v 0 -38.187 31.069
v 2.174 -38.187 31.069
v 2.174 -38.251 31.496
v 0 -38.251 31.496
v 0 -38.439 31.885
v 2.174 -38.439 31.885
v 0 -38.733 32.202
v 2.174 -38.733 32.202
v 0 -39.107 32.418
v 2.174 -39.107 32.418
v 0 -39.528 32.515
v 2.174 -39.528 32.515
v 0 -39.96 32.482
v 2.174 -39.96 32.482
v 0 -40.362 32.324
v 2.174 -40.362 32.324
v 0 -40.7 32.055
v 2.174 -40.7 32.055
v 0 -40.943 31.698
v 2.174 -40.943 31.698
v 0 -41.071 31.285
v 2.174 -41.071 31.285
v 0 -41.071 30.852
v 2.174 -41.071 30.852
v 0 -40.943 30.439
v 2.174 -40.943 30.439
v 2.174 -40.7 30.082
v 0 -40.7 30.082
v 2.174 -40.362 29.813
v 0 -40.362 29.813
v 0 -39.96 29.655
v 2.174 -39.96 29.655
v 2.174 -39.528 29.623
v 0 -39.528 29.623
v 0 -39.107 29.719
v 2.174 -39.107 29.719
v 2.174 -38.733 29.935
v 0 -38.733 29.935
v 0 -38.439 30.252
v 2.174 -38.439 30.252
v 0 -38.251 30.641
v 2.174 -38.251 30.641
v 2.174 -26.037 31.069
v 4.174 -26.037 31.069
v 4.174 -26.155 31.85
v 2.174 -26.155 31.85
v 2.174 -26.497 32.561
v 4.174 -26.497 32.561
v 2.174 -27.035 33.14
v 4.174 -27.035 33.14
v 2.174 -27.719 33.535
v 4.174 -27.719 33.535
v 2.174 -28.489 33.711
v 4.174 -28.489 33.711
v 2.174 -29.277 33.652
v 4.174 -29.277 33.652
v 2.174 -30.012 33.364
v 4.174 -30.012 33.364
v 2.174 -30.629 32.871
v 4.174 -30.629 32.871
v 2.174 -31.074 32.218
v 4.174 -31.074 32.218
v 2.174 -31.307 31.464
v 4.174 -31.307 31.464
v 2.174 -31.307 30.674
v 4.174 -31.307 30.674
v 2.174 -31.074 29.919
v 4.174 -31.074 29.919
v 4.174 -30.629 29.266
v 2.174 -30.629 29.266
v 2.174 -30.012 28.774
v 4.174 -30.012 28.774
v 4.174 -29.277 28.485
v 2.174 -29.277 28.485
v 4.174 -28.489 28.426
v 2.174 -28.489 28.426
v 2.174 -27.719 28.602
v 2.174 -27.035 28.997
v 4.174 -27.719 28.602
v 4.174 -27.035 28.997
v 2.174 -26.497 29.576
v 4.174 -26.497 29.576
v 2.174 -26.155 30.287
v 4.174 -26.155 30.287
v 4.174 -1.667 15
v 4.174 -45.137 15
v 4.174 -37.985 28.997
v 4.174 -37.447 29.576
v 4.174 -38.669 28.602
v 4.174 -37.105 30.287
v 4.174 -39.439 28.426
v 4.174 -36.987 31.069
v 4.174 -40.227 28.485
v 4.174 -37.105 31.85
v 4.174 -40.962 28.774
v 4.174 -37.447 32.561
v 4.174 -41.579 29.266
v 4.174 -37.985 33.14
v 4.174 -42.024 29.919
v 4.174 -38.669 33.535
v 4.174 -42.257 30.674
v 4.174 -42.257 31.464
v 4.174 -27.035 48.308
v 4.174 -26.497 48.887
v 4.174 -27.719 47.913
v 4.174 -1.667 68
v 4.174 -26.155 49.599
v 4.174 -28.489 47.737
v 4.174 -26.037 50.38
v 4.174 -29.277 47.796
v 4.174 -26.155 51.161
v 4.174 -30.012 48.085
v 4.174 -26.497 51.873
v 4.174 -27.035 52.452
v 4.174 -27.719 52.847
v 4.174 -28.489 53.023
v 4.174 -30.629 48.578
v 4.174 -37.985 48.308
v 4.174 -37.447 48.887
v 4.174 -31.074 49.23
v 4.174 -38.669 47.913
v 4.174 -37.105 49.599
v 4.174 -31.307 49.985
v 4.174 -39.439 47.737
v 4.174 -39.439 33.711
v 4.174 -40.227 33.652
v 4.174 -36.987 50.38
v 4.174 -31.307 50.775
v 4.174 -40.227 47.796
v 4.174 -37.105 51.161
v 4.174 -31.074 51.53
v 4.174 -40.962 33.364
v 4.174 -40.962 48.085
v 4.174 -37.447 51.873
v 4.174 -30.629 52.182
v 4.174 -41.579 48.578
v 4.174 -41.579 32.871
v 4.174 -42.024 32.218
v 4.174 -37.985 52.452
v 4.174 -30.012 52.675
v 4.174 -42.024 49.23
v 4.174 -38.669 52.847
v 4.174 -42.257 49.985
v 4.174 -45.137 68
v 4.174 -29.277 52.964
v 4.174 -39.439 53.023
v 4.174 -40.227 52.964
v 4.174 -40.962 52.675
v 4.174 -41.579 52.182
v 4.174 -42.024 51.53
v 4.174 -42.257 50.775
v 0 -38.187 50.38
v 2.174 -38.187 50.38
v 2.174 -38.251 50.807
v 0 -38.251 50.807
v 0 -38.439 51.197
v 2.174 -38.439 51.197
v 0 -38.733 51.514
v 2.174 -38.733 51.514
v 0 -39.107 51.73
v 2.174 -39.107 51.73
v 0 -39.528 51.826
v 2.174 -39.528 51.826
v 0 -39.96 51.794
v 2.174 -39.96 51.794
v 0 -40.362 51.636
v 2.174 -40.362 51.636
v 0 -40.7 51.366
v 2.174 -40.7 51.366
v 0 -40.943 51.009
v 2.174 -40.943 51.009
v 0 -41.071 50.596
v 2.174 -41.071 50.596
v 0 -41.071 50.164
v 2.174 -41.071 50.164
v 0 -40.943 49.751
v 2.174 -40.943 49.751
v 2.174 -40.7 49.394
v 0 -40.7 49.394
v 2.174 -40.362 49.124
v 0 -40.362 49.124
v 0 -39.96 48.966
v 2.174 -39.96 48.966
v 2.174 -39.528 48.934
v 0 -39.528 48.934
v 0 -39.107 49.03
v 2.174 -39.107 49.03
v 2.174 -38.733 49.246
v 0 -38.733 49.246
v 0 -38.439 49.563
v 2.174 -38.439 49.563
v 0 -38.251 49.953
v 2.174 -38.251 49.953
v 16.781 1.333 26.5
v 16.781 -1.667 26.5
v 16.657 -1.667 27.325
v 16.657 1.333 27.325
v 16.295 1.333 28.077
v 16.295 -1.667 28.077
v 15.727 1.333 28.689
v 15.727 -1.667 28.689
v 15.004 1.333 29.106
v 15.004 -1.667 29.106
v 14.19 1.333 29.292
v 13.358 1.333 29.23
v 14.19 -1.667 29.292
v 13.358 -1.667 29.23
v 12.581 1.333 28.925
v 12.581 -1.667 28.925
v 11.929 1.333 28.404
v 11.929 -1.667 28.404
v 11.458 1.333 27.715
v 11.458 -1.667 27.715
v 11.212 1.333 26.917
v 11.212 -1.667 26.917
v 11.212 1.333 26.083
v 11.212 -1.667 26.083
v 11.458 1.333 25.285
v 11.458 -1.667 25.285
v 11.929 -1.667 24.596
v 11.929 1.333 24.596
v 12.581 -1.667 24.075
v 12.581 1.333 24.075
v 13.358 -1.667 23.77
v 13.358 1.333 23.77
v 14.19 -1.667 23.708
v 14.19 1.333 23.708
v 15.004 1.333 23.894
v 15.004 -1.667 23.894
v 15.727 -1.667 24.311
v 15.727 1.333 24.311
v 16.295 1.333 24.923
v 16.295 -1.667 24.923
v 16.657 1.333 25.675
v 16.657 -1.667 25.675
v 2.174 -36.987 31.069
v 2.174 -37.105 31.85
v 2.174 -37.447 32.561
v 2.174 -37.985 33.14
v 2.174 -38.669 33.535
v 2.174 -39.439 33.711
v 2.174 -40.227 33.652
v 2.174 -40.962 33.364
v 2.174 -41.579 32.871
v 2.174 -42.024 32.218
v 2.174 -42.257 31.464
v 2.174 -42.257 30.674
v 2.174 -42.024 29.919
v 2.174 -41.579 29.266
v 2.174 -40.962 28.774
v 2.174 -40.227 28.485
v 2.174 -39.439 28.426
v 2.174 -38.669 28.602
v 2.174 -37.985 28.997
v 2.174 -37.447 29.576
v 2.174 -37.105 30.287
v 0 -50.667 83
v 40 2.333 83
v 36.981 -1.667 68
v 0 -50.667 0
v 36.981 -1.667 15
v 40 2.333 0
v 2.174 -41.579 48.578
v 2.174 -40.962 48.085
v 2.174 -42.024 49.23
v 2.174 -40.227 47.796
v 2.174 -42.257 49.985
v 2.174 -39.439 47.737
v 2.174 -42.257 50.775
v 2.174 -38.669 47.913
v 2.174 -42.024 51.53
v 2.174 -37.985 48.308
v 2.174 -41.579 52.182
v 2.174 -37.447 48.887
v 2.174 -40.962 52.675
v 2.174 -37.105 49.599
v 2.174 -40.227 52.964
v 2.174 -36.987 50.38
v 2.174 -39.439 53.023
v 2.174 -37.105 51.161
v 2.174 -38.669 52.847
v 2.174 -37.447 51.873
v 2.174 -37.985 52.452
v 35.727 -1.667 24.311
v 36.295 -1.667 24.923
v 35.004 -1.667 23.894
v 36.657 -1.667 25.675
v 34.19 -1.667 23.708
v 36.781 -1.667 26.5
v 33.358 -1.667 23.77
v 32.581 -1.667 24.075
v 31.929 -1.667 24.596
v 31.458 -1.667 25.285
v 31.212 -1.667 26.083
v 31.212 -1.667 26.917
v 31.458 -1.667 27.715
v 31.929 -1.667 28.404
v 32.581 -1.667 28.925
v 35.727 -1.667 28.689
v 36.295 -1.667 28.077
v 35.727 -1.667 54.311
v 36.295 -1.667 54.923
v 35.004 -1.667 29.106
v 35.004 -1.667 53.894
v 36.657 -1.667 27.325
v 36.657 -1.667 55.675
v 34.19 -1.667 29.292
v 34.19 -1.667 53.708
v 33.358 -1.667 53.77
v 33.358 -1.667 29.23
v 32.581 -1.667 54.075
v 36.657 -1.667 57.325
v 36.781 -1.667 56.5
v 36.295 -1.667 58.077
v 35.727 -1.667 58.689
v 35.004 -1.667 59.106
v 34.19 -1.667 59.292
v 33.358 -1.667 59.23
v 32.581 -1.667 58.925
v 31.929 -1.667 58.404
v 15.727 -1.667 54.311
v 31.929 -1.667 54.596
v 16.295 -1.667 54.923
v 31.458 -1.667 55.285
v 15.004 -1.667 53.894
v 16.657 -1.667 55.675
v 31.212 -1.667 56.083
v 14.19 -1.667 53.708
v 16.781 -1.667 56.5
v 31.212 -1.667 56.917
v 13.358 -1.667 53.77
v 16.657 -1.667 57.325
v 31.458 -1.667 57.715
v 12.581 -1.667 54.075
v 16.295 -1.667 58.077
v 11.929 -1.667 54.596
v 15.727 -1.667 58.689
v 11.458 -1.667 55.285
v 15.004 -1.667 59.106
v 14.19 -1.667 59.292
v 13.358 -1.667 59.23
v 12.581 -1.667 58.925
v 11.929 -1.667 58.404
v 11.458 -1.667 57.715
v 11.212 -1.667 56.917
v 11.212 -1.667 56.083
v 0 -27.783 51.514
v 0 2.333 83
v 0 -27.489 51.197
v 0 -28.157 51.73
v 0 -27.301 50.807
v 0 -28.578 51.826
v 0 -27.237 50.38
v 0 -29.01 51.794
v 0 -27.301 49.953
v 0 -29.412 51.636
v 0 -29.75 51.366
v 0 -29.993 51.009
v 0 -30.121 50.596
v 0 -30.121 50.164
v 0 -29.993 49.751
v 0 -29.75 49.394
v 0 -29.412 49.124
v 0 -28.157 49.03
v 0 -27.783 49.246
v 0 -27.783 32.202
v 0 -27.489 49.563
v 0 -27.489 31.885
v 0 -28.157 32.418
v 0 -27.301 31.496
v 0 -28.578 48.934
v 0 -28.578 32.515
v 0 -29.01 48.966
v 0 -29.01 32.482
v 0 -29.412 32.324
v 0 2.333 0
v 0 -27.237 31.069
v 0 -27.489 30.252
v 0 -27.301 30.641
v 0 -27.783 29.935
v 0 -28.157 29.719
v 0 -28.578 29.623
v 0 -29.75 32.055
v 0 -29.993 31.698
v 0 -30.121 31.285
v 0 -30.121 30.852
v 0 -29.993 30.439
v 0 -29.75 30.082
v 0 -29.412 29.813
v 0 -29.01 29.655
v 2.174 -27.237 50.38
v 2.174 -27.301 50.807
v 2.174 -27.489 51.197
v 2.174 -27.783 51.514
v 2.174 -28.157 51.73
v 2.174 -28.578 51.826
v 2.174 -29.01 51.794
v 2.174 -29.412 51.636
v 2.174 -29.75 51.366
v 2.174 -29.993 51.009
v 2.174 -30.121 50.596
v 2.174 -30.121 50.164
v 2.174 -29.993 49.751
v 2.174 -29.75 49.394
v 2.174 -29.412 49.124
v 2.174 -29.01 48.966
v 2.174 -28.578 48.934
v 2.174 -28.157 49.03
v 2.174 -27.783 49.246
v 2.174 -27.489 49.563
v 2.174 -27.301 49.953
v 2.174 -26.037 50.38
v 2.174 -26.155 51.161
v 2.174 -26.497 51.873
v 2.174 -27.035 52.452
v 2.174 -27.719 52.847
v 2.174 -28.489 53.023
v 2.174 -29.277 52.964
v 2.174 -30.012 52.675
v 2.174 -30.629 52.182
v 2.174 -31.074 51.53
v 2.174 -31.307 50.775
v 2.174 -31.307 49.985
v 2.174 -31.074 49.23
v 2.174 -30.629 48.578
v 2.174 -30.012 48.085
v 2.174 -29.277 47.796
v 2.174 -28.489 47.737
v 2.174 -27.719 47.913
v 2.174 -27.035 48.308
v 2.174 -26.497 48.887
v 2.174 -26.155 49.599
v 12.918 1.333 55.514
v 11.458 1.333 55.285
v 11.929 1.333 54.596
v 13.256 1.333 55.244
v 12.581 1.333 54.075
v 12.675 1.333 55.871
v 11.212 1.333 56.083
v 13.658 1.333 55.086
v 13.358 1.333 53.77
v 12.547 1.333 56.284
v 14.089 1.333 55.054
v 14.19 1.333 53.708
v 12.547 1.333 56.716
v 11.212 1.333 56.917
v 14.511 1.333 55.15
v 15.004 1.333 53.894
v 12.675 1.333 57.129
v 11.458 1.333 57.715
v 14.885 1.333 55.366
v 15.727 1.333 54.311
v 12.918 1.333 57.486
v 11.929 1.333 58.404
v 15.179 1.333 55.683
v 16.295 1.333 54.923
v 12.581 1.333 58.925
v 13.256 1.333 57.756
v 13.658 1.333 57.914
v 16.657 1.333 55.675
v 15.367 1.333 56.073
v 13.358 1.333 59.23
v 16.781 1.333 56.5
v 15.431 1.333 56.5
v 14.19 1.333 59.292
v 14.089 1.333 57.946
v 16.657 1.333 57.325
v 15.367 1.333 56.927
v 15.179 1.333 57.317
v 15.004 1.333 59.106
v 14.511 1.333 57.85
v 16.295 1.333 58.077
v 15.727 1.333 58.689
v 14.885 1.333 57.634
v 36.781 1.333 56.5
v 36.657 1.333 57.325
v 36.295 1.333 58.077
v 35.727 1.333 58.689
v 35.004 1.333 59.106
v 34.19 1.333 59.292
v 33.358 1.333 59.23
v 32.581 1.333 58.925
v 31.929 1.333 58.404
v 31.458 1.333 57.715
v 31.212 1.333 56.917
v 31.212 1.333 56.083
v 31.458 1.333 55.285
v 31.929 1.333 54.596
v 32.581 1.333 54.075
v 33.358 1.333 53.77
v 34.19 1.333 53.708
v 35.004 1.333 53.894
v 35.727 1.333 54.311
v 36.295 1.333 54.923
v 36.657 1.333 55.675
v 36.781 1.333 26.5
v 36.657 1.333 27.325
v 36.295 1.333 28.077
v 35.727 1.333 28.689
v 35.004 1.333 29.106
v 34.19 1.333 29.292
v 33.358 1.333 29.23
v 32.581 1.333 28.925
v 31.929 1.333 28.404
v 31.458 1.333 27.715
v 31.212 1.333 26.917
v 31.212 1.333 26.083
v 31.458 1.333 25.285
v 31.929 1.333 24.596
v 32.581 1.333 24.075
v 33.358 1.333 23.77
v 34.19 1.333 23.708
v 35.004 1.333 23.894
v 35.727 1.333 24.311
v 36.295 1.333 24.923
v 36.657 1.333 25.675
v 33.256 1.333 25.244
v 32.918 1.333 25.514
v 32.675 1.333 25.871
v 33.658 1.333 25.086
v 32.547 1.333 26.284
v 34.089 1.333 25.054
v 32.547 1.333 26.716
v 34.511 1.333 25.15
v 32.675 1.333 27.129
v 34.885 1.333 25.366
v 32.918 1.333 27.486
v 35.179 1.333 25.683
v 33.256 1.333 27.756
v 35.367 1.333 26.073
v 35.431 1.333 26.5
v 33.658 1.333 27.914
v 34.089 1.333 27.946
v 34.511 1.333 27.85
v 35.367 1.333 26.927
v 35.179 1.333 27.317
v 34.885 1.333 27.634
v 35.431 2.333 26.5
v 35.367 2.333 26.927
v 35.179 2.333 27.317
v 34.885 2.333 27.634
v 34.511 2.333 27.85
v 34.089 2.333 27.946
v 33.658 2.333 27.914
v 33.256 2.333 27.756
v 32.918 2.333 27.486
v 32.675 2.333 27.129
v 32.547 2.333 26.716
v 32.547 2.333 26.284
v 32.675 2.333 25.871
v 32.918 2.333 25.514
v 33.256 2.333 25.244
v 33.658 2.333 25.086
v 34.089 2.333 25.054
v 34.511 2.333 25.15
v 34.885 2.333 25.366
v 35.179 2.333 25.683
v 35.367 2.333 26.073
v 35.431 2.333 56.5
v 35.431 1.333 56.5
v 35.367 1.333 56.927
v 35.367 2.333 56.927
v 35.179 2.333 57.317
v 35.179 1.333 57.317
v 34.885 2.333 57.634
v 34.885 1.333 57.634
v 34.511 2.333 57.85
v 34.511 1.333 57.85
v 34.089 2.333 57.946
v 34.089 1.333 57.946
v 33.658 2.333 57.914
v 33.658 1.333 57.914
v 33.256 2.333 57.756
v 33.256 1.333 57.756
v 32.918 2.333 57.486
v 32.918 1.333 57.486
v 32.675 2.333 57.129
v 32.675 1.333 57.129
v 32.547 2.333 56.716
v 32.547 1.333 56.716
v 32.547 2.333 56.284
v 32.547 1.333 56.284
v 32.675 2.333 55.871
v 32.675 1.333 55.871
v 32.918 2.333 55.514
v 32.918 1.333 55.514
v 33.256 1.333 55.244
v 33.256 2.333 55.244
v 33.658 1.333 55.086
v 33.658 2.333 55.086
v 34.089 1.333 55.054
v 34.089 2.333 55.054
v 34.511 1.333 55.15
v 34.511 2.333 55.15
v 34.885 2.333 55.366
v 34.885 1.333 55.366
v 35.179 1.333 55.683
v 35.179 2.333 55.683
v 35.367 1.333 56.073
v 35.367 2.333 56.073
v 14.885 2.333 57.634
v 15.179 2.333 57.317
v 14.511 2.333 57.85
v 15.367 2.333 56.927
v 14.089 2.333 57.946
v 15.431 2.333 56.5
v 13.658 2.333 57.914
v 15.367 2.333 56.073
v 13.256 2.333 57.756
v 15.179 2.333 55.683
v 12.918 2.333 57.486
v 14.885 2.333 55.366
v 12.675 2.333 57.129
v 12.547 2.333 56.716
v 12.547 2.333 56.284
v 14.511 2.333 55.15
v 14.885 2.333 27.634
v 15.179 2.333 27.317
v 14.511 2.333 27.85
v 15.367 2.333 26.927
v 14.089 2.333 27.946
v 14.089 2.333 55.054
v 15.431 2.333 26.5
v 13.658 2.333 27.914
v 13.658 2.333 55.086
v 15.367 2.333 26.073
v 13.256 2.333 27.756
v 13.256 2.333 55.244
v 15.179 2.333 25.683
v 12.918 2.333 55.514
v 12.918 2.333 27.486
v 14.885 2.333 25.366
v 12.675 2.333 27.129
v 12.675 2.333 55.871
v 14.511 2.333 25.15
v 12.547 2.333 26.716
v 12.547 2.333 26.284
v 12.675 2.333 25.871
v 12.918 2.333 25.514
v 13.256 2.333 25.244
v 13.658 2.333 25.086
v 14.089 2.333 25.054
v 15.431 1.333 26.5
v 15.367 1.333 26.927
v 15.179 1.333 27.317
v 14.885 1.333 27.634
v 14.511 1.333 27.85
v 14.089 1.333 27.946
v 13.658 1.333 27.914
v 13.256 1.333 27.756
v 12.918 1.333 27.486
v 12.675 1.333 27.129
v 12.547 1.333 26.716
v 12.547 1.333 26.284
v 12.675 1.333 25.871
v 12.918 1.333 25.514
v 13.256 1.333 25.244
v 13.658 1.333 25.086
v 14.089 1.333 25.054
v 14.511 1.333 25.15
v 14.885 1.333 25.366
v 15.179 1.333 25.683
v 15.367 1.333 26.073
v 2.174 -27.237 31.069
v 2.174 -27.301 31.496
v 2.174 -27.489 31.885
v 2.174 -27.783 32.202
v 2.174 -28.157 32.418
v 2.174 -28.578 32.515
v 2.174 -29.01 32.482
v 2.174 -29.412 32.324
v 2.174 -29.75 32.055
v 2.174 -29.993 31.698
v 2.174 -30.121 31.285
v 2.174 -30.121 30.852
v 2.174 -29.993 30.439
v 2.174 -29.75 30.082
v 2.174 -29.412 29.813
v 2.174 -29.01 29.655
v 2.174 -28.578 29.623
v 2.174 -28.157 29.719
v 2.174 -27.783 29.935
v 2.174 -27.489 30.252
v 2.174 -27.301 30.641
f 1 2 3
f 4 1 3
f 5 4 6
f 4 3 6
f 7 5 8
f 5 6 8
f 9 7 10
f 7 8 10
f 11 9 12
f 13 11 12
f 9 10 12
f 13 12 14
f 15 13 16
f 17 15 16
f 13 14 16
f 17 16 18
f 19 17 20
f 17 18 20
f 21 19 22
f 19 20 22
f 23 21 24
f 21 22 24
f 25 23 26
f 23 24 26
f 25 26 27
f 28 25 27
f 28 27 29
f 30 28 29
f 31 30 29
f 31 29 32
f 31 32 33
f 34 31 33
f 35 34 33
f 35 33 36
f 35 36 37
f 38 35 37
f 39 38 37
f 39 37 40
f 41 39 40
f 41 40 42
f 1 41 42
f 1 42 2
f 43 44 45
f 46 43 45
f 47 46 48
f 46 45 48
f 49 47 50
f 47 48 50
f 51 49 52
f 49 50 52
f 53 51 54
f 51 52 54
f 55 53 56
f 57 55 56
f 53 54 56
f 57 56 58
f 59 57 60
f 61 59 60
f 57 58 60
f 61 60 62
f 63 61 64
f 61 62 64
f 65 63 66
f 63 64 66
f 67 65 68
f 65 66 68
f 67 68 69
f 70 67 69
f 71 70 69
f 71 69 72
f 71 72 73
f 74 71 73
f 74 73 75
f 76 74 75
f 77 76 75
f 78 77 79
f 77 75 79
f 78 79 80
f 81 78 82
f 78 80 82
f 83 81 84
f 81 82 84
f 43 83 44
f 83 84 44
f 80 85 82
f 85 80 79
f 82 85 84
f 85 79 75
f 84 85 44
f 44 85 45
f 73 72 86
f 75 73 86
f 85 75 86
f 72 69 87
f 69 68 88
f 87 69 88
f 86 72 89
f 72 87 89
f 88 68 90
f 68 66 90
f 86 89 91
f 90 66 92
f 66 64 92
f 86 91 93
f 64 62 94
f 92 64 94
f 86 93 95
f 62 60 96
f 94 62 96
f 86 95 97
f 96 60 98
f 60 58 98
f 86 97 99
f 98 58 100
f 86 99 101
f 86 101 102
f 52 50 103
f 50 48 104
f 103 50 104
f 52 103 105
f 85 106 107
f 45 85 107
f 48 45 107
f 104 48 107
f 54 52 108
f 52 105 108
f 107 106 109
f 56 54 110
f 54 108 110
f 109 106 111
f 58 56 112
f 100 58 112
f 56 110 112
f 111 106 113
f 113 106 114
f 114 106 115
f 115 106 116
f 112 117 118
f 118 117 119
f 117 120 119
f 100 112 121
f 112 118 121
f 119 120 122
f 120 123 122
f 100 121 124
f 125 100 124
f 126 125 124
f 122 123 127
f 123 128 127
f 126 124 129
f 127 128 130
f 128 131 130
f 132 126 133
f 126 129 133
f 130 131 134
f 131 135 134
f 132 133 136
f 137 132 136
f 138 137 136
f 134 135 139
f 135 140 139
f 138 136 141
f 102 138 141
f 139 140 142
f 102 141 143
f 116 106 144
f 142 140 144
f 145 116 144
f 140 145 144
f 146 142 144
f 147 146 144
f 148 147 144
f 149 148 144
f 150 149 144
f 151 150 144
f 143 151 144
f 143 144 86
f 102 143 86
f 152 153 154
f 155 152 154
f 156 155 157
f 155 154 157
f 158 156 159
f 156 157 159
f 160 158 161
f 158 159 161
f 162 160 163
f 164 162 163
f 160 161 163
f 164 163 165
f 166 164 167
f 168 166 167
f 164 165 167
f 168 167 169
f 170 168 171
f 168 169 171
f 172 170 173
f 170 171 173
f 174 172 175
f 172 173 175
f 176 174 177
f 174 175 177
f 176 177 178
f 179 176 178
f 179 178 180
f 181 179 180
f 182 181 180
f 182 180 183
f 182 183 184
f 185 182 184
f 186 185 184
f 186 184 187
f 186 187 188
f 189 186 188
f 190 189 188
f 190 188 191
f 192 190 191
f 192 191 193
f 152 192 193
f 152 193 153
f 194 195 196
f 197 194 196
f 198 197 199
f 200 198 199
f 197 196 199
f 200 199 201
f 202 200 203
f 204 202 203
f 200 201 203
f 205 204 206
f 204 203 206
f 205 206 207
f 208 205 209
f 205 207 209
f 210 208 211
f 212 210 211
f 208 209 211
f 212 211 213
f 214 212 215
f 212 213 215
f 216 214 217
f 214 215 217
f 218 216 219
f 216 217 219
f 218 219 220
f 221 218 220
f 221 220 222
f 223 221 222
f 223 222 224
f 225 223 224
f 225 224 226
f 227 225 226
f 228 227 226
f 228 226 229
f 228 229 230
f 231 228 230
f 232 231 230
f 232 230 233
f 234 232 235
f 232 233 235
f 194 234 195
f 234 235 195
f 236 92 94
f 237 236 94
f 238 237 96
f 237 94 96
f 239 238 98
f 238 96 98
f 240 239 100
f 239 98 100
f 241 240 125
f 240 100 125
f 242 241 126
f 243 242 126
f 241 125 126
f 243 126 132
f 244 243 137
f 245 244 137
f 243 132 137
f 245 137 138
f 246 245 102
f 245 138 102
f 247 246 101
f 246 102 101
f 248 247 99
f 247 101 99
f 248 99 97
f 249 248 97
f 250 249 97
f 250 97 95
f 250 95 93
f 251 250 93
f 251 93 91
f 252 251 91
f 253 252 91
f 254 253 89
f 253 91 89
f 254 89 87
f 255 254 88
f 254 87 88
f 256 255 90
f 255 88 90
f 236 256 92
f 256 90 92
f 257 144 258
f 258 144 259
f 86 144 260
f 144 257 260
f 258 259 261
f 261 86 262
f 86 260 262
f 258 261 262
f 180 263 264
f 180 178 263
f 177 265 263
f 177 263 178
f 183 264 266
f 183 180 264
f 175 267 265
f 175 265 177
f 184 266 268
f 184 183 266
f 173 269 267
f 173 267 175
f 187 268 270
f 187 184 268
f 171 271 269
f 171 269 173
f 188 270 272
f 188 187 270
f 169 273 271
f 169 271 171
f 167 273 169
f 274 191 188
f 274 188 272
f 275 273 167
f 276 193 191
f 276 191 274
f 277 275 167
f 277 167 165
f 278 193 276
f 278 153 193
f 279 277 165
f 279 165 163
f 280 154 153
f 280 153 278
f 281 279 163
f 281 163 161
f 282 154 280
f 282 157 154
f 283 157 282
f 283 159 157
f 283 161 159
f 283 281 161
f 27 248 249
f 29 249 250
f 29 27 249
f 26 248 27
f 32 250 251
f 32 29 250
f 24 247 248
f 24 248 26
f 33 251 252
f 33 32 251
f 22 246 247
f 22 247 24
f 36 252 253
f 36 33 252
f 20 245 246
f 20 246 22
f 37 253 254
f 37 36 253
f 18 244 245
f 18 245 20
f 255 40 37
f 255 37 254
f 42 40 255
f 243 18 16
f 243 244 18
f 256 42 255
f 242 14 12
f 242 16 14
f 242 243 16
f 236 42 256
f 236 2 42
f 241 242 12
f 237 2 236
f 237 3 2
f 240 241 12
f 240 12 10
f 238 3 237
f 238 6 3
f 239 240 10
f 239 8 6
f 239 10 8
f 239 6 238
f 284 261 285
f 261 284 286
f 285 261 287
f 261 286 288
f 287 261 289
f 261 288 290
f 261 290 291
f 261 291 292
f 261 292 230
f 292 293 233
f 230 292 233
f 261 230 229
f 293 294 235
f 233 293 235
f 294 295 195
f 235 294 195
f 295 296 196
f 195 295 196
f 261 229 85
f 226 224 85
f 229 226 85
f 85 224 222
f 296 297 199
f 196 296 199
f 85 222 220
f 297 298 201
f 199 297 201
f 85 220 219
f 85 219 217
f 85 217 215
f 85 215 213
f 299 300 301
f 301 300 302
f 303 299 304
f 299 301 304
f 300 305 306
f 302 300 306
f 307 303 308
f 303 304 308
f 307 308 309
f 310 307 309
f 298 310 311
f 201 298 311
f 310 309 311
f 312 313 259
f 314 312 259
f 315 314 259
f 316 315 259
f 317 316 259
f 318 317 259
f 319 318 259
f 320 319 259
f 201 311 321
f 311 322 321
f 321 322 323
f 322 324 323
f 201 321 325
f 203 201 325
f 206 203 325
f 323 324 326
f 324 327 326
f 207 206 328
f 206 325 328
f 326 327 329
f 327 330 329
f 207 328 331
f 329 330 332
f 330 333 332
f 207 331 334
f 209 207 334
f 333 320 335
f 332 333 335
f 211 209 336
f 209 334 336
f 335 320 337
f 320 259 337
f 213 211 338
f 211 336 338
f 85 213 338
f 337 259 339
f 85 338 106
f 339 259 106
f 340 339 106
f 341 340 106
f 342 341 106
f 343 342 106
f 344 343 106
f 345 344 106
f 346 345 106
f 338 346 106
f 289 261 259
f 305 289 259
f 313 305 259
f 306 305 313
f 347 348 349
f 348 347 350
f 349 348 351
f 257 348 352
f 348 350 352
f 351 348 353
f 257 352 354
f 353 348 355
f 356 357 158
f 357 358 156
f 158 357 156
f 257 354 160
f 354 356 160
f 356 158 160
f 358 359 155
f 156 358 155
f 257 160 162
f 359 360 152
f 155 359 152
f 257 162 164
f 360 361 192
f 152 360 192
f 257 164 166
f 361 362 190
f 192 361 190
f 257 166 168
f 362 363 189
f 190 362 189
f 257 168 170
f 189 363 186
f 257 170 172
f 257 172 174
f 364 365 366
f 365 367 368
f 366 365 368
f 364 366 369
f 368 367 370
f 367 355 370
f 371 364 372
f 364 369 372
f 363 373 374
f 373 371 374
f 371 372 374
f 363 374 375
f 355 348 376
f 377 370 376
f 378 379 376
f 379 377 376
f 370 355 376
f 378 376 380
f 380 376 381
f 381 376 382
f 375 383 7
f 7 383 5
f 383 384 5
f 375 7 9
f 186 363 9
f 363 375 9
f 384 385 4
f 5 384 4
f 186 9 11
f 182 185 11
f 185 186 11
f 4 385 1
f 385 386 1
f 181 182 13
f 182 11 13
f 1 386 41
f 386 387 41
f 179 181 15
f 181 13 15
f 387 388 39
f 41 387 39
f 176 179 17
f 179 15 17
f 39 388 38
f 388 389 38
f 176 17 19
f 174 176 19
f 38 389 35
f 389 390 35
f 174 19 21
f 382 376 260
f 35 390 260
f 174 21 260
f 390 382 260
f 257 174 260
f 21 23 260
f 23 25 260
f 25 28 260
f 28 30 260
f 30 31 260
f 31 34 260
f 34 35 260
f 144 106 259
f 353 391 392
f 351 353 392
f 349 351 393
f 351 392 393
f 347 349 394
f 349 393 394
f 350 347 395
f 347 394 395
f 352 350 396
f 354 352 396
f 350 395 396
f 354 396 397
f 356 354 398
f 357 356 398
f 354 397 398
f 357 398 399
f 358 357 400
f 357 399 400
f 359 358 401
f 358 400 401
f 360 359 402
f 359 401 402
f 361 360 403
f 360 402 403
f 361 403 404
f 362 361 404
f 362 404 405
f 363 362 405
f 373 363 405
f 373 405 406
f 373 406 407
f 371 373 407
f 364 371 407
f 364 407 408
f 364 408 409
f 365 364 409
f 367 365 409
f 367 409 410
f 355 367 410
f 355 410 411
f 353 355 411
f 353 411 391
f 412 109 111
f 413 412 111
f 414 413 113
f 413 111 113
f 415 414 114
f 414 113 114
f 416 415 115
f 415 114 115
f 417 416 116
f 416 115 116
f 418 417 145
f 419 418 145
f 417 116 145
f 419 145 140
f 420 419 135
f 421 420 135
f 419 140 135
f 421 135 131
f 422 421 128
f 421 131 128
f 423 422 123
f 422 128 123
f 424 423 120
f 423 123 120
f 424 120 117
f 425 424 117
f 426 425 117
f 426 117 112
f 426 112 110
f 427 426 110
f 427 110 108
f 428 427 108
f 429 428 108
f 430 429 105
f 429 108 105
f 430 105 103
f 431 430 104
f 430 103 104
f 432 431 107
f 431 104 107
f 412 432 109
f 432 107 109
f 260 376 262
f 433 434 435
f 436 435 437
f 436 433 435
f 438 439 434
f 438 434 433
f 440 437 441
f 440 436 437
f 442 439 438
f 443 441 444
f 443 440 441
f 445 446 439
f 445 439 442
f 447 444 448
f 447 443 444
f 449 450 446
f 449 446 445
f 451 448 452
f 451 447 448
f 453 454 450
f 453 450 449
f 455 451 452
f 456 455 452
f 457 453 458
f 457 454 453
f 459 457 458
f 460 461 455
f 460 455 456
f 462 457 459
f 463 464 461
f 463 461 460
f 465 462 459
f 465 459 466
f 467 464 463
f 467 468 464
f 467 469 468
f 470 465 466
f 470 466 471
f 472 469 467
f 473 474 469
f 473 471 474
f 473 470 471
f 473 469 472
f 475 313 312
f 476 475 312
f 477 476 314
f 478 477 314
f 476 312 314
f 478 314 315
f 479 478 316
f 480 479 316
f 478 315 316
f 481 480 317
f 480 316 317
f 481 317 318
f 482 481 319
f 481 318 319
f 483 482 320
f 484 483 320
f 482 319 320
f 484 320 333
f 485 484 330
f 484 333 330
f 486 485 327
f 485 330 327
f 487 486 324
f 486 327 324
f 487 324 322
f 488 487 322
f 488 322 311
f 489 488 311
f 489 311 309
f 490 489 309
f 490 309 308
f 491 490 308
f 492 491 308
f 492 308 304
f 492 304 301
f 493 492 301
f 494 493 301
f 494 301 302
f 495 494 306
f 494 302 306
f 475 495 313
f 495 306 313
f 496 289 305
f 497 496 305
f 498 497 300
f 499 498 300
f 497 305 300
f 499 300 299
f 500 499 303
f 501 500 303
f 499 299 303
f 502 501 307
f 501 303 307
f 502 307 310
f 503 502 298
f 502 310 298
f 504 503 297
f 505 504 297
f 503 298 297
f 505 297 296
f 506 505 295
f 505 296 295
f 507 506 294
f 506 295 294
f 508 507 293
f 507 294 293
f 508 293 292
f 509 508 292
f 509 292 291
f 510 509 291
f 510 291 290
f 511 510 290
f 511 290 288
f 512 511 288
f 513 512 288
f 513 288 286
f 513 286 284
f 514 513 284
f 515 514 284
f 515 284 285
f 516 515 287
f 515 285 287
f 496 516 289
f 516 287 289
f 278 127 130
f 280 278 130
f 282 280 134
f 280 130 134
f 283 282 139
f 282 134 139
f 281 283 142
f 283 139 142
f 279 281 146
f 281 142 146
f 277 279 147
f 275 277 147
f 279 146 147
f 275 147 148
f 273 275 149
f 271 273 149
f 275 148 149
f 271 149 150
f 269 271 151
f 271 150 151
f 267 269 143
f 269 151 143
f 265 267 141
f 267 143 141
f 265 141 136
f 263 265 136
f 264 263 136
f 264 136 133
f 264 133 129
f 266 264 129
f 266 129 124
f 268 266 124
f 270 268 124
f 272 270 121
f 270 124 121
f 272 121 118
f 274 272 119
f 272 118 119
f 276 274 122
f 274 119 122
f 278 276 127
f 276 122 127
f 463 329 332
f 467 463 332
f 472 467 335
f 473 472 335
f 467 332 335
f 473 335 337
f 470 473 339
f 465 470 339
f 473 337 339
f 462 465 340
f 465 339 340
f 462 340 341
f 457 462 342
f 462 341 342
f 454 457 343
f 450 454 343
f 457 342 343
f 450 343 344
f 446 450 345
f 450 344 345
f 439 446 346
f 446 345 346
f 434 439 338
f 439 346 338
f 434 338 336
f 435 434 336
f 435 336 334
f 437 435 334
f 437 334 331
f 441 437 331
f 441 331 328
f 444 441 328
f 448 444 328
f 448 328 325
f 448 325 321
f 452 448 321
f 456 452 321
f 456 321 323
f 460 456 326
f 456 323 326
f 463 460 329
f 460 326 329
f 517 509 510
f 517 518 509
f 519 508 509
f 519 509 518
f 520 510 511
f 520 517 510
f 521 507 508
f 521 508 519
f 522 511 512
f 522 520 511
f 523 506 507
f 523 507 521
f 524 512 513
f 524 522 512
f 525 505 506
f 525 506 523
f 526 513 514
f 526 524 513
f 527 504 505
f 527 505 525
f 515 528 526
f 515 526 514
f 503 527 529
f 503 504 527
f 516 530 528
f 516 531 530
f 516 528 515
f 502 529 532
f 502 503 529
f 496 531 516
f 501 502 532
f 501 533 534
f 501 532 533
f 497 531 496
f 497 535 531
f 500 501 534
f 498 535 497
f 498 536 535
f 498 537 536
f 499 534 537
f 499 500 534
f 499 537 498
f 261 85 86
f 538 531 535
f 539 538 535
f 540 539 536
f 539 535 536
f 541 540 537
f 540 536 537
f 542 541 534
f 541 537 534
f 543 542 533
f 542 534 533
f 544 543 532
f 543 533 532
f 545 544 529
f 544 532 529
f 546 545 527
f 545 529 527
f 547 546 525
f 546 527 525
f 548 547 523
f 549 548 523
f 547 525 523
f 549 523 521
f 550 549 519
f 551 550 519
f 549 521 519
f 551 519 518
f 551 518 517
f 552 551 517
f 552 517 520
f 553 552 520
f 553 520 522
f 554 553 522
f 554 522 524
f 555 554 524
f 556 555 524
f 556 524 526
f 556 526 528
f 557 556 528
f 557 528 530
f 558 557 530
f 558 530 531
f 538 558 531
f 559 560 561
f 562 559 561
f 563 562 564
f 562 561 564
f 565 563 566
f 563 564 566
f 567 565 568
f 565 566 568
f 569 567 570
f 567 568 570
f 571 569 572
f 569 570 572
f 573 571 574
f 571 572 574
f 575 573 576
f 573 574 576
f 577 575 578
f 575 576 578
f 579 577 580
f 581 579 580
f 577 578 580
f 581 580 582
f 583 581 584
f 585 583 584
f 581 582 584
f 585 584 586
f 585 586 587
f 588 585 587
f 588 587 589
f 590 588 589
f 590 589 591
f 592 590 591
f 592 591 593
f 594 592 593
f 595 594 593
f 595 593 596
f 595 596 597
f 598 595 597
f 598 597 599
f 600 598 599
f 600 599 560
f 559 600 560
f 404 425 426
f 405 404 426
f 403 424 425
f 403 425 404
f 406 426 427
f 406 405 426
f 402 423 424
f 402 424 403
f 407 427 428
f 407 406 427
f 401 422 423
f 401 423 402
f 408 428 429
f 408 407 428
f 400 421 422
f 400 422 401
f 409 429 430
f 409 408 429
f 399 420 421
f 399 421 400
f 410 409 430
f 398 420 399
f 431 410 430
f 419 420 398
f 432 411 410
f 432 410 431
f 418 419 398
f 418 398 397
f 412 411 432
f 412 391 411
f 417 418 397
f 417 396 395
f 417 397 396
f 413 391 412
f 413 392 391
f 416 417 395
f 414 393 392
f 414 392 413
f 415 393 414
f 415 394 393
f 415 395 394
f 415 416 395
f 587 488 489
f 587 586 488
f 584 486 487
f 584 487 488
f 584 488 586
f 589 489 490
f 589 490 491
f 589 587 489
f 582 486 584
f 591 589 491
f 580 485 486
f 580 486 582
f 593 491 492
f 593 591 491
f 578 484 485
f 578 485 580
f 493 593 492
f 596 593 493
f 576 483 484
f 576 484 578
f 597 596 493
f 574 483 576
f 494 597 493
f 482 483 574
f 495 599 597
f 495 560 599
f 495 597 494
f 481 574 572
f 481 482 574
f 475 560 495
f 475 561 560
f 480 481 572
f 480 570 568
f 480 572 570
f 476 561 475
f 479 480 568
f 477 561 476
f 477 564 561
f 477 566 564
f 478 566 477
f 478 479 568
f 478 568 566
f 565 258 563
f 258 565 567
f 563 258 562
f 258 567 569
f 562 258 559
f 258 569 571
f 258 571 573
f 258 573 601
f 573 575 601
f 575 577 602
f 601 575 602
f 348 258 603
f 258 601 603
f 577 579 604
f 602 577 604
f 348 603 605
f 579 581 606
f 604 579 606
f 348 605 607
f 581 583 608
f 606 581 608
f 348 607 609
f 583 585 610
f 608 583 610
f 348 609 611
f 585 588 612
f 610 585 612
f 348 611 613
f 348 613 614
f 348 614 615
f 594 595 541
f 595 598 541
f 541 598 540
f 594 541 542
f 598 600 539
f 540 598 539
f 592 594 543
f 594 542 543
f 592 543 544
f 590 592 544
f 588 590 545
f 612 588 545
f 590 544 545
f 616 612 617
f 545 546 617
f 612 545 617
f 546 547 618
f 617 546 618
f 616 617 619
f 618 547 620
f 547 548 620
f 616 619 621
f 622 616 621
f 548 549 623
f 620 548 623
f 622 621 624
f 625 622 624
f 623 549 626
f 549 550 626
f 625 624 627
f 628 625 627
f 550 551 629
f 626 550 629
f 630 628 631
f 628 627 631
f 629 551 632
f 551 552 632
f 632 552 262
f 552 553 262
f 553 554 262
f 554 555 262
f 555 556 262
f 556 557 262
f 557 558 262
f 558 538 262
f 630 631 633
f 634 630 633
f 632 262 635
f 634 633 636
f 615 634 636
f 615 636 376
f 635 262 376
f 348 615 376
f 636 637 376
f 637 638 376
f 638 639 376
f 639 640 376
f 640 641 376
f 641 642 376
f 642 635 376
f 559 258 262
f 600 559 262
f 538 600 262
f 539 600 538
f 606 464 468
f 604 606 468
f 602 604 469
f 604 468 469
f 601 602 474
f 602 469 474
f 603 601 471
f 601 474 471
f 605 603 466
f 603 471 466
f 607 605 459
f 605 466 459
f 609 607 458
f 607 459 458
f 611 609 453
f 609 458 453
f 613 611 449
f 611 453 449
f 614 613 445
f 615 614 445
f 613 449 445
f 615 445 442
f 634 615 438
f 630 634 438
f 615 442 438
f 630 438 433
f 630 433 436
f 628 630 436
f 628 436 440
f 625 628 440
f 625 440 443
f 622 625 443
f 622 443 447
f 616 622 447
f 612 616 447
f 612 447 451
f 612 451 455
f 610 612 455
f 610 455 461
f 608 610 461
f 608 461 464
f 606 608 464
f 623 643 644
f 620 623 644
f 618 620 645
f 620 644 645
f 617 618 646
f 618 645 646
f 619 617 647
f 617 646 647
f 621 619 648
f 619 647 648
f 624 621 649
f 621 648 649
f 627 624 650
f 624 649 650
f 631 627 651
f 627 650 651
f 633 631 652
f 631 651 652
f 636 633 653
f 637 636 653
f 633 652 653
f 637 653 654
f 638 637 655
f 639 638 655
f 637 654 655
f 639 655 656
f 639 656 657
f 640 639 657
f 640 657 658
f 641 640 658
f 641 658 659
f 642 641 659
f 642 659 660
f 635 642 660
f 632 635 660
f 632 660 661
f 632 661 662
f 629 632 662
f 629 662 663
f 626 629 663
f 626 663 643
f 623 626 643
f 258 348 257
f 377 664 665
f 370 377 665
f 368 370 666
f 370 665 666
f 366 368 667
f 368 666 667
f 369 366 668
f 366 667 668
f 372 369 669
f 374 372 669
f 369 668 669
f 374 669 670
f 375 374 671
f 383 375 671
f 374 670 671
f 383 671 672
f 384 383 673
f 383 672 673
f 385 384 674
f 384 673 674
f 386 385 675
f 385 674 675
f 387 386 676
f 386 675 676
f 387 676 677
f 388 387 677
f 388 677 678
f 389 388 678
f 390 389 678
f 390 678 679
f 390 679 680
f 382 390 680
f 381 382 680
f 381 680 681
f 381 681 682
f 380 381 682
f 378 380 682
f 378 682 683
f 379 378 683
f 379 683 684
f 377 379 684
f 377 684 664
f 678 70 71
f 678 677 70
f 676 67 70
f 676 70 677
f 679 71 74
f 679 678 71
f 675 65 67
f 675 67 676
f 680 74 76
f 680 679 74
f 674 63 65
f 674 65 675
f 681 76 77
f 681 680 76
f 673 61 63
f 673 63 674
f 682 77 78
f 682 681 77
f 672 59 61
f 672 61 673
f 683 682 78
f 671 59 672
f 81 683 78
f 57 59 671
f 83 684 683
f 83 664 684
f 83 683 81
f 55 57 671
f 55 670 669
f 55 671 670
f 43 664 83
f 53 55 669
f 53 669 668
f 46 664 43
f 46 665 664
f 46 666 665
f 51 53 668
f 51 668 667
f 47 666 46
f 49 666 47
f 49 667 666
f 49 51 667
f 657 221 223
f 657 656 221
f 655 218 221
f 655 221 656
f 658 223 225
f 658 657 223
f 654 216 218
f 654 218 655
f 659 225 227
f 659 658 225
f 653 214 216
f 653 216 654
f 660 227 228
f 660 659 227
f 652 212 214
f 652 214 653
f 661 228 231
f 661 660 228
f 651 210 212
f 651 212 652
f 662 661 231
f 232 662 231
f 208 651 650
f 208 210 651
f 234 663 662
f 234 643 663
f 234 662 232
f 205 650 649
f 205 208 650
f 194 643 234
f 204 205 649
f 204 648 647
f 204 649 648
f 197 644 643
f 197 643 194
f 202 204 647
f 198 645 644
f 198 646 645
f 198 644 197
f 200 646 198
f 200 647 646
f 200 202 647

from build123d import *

# Parameters (mm, degrees)
EXTRUDE_1_DEPTH     = 83
CUT_EXTRUDE_1_DEPTH = 26.5
SKETCH_4_R          = 1.45
CUT_EXTRUDE_3_DEPTH = 10
SKETCH_5_R          = 1.45
CUT_EXTRUDE_4_DEPTH = 10
SKETCH_6_R          = 2.65
CUT_EXTRUDE_5_DEPTH = 2
SKETCH_7_R          = 2.8
CUT_EXTRUDE_6_DEPTH = 3


with BuildPart() as part:
    # 草图1 → 凸台-拉伸1 (new body)
    with BuildSketch(Plane.XY):
        Polygon((0, 2.333144796), (0, -50.666855204), (40, 2.333144796), align=None)
    extrude(amount=EXTRUDE_1_DEPTH)

    # 草图3 → 切除-拉伸1 (cut, symmetric)
    with BuildSketch(Plane.XY.offset(41.5)):
        Polygon((36.981132075, -1.666855204), (4.173584906, -1.666855204), (4.173584906, -45.136855204), align=None)
    extrude(amount=CUT_EXTRUDE_1_DEPTH, both=True, mode=Mode.SUBTRACT)

    # 草图4 → 切除-拉伸3 (cut)
    with BuildSketch(Plane(origin=(4.173584906, 0, 0), x_dir=(0, 0, -1), z_dir=(1, 0, 0))):
        with Locations(Location((-31.068580938, -39.636855204, 0), (0, 0, 90))):
            Circle(SKETCH_4_R)
        with Locations(Location((-31.068580938, -28.686855204, 0), (0, 0, 90))):
            Circle(SKETCH_4_R)
        with Locations(Location((-50.38, -28.686855204, 0), (0, 0, 90))):
            Circle(SKETCH_4_R)
        with Locations(Location((-50.38, -39.636855204, 0), (0, 0, 90))):
            Circle(SKETCH_4_R)
    extrude(amount=-CUT_EXTRUDE_3_DEPTH, mode=Mode.SUBTRACT)

    # 草图5 → 切除-拉伸4 (cut)
    with BuildSketch(Plane.XZ.offset(1.666855204)):
        with Locations((13.981132075, 56.5)):
            Circle(SKETCH_5_R)
        with Locations((33.981132075, 56.5)):
            Circle(SKETCH_5_R)
        with Locations((13.981132075, 26.5)):
            Circle(SKETCH_5_R)
        with Locations((33.981132075, 26.5)):
            Circle(SKETCH_5_R)
    extrude(amount=-CUT_EXTRUDE_4_DEPTH, mode=Mode.SUBTRACT)

    # 草图6 → 切除-拉伸5 (cut)
    with BuildSketch(Plane(origin=(4.173584906, 0, 0), x_dir=(0, 0, -1), z_dir=(1, 0, 0))):
        with Locations(Location((-50.38, -28.686855204, 0), (0, 0, 90))):
            Circle(SKETCH_6_R)
        with Locations(Location((-31.068580938, -28.686855204, 0), (0, 0, 90))):
            Circle(SKETCH_6_R)
        with Locations(Location((-50.38, -39.636855204, 0), (0, 0, 90))):
            Circle(SKETCH_6_R)
        with Locations(Location((-31.068580938, -39.636855204, 0), (0, 0, 90))):
            Circle(SKETCH_6_R)
    extrude(amount=-CUT_EXTRUDE_5_DEPTH, mode=Mode.SUBTRACT)

    # 草图7 → 切除-拉伸6 (cut)
    with BuildSketch(Plane.XZ.offset(1.666855204)):
        with Locations((13.981132075, 56.5)):
            Circle(SKETCH_7_R)
        with Locations((33.981132075, 56.5)):
            Circle(SKETCH_7_R)
        with Locations((13.981132075, 26.5)):
            Circle(SKETCH_7_R)
        with Locations((33.981132075, 26.5)):
            Circle(SKETCH_7_R)
    extrude(amount=-CUT_EXTRUDE_6_DEPTH, mode=Mode.SUBTRACT)


solid = part.part
